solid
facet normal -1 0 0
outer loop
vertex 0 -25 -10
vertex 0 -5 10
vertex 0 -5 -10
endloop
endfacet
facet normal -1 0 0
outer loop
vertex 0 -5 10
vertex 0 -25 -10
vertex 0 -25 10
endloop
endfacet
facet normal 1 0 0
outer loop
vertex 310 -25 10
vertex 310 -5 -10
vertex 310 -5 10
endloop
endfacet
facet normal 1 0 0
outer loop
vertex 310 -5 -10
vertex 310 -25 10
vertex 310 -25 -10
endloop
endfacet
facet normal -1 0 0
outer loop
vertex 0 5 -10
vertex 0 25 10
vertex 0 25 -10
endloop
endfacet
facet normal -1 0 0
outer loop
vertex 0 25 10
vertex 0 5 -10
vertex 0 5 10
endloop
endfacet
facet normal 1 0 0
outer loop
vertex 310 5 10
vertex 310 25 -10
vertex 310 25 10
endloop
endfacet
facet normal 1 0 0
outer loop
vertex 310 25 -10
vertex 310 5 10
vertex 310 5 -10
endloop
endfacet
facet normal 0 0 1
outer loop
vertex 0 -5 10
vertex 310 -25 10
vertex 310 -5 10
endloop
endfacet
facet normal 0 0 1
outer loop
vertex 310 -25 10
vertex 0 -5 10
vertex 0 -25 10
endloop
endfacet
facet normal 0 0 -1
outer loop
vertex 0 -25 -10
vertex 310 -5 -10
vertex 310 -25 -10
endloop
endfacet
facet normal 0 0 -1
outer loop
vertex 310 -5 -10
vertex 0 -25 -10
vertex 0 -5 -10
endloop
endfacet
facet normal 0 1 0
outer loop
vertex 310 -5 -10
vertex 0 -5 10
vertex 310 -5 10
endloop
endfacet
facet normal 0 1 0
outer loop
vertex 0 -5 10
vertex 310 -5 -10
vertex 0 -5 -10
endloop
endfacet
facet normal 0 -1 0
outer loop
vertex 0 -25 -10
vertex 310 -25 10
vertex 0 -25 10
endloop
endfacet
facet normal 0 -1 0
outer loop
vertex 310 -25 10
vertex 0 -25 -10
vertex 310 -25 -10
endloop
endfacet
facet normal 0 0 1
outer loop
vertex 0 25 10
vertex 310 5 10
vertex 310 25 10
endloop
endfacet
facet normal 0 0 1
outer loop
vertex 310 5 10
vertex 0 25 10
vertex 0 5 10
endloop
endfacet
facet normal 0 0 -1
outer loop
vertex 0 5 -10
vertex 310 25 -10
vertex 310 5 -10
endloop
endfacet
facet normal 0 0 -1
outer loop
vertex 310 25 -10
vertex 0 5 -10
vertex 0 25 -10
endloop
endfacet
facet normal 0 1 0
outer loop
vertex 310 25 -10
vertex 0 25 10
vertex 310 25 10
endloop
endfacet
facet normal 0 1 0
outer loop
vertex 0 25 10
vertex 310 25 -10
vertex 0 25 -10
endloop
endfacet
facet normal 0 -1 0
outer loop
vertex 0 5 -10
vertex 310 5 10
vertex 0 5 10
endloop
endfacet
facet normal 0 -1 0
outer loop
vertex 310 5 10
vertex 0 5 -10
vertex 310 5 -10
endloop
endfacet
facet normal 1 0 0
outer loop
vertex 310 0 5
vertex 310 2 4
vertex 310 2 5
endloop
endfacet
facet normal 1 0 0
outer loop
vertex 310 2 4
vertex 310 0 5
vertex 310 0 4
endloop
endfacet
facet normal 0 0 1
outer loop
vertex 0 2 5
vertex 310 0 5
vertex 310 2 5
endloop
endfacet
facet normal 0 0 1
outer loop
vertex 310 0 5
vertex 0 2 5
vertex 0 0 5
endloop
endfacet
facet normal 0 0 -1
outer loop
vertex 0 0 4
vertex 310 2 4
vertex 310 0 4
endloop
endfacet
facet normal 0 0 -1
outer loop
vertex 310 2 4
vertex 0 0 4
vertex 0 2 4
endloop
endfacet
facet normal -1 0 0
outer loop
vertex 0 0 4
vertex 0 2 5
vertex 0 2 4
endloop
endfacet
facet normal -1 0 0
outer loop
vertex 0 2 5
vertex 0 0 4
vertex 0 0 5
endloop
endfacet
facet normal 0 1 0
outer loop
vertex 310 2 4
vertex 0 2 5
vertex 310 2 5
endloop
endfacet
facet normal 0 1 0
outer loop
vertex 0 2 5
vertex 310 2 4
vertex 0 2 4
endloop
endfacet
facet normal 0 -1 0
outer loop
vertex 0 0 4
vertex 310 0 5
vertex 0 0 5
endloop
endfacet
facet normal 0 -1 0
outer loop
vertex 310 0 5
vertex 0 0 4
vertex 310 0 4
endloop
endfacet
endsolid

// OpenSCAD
module assembly_preview() {
  rod_d = 8.0;
  rod_spacing = 40.0;
  rod_len = 310.0;
  
  module rods(){
    color([0.7,0.7,0.7]) {
      translate([0, -rod_spacing/2, 0]) rotate([0,90,0]) cylinder(h=rod_len, d=rod_d, center=false);
      translate([0,  rod_spacing/2, 0]) rotate([0,90,0]) cylinder(h=rod_len, d=rod_d, center=false);
    }
  }
  rods();
  color([0.3,0.3,0.3]) translate([0, -25, -10]) cube([rod_len, 20, 20], center=false);
  color([0.3,0.3,0.3]) translate([0,  5, -10]) cube([rod_len, 20, 20], center=false);
  color([0.1,0.1,0.1]) translate([0,0,rod_d/2]) cube([rod_len, 2, 1], center=false);
  // Import and position printable parts manually if you want a full assembly preview.
}
assembly_preview();
